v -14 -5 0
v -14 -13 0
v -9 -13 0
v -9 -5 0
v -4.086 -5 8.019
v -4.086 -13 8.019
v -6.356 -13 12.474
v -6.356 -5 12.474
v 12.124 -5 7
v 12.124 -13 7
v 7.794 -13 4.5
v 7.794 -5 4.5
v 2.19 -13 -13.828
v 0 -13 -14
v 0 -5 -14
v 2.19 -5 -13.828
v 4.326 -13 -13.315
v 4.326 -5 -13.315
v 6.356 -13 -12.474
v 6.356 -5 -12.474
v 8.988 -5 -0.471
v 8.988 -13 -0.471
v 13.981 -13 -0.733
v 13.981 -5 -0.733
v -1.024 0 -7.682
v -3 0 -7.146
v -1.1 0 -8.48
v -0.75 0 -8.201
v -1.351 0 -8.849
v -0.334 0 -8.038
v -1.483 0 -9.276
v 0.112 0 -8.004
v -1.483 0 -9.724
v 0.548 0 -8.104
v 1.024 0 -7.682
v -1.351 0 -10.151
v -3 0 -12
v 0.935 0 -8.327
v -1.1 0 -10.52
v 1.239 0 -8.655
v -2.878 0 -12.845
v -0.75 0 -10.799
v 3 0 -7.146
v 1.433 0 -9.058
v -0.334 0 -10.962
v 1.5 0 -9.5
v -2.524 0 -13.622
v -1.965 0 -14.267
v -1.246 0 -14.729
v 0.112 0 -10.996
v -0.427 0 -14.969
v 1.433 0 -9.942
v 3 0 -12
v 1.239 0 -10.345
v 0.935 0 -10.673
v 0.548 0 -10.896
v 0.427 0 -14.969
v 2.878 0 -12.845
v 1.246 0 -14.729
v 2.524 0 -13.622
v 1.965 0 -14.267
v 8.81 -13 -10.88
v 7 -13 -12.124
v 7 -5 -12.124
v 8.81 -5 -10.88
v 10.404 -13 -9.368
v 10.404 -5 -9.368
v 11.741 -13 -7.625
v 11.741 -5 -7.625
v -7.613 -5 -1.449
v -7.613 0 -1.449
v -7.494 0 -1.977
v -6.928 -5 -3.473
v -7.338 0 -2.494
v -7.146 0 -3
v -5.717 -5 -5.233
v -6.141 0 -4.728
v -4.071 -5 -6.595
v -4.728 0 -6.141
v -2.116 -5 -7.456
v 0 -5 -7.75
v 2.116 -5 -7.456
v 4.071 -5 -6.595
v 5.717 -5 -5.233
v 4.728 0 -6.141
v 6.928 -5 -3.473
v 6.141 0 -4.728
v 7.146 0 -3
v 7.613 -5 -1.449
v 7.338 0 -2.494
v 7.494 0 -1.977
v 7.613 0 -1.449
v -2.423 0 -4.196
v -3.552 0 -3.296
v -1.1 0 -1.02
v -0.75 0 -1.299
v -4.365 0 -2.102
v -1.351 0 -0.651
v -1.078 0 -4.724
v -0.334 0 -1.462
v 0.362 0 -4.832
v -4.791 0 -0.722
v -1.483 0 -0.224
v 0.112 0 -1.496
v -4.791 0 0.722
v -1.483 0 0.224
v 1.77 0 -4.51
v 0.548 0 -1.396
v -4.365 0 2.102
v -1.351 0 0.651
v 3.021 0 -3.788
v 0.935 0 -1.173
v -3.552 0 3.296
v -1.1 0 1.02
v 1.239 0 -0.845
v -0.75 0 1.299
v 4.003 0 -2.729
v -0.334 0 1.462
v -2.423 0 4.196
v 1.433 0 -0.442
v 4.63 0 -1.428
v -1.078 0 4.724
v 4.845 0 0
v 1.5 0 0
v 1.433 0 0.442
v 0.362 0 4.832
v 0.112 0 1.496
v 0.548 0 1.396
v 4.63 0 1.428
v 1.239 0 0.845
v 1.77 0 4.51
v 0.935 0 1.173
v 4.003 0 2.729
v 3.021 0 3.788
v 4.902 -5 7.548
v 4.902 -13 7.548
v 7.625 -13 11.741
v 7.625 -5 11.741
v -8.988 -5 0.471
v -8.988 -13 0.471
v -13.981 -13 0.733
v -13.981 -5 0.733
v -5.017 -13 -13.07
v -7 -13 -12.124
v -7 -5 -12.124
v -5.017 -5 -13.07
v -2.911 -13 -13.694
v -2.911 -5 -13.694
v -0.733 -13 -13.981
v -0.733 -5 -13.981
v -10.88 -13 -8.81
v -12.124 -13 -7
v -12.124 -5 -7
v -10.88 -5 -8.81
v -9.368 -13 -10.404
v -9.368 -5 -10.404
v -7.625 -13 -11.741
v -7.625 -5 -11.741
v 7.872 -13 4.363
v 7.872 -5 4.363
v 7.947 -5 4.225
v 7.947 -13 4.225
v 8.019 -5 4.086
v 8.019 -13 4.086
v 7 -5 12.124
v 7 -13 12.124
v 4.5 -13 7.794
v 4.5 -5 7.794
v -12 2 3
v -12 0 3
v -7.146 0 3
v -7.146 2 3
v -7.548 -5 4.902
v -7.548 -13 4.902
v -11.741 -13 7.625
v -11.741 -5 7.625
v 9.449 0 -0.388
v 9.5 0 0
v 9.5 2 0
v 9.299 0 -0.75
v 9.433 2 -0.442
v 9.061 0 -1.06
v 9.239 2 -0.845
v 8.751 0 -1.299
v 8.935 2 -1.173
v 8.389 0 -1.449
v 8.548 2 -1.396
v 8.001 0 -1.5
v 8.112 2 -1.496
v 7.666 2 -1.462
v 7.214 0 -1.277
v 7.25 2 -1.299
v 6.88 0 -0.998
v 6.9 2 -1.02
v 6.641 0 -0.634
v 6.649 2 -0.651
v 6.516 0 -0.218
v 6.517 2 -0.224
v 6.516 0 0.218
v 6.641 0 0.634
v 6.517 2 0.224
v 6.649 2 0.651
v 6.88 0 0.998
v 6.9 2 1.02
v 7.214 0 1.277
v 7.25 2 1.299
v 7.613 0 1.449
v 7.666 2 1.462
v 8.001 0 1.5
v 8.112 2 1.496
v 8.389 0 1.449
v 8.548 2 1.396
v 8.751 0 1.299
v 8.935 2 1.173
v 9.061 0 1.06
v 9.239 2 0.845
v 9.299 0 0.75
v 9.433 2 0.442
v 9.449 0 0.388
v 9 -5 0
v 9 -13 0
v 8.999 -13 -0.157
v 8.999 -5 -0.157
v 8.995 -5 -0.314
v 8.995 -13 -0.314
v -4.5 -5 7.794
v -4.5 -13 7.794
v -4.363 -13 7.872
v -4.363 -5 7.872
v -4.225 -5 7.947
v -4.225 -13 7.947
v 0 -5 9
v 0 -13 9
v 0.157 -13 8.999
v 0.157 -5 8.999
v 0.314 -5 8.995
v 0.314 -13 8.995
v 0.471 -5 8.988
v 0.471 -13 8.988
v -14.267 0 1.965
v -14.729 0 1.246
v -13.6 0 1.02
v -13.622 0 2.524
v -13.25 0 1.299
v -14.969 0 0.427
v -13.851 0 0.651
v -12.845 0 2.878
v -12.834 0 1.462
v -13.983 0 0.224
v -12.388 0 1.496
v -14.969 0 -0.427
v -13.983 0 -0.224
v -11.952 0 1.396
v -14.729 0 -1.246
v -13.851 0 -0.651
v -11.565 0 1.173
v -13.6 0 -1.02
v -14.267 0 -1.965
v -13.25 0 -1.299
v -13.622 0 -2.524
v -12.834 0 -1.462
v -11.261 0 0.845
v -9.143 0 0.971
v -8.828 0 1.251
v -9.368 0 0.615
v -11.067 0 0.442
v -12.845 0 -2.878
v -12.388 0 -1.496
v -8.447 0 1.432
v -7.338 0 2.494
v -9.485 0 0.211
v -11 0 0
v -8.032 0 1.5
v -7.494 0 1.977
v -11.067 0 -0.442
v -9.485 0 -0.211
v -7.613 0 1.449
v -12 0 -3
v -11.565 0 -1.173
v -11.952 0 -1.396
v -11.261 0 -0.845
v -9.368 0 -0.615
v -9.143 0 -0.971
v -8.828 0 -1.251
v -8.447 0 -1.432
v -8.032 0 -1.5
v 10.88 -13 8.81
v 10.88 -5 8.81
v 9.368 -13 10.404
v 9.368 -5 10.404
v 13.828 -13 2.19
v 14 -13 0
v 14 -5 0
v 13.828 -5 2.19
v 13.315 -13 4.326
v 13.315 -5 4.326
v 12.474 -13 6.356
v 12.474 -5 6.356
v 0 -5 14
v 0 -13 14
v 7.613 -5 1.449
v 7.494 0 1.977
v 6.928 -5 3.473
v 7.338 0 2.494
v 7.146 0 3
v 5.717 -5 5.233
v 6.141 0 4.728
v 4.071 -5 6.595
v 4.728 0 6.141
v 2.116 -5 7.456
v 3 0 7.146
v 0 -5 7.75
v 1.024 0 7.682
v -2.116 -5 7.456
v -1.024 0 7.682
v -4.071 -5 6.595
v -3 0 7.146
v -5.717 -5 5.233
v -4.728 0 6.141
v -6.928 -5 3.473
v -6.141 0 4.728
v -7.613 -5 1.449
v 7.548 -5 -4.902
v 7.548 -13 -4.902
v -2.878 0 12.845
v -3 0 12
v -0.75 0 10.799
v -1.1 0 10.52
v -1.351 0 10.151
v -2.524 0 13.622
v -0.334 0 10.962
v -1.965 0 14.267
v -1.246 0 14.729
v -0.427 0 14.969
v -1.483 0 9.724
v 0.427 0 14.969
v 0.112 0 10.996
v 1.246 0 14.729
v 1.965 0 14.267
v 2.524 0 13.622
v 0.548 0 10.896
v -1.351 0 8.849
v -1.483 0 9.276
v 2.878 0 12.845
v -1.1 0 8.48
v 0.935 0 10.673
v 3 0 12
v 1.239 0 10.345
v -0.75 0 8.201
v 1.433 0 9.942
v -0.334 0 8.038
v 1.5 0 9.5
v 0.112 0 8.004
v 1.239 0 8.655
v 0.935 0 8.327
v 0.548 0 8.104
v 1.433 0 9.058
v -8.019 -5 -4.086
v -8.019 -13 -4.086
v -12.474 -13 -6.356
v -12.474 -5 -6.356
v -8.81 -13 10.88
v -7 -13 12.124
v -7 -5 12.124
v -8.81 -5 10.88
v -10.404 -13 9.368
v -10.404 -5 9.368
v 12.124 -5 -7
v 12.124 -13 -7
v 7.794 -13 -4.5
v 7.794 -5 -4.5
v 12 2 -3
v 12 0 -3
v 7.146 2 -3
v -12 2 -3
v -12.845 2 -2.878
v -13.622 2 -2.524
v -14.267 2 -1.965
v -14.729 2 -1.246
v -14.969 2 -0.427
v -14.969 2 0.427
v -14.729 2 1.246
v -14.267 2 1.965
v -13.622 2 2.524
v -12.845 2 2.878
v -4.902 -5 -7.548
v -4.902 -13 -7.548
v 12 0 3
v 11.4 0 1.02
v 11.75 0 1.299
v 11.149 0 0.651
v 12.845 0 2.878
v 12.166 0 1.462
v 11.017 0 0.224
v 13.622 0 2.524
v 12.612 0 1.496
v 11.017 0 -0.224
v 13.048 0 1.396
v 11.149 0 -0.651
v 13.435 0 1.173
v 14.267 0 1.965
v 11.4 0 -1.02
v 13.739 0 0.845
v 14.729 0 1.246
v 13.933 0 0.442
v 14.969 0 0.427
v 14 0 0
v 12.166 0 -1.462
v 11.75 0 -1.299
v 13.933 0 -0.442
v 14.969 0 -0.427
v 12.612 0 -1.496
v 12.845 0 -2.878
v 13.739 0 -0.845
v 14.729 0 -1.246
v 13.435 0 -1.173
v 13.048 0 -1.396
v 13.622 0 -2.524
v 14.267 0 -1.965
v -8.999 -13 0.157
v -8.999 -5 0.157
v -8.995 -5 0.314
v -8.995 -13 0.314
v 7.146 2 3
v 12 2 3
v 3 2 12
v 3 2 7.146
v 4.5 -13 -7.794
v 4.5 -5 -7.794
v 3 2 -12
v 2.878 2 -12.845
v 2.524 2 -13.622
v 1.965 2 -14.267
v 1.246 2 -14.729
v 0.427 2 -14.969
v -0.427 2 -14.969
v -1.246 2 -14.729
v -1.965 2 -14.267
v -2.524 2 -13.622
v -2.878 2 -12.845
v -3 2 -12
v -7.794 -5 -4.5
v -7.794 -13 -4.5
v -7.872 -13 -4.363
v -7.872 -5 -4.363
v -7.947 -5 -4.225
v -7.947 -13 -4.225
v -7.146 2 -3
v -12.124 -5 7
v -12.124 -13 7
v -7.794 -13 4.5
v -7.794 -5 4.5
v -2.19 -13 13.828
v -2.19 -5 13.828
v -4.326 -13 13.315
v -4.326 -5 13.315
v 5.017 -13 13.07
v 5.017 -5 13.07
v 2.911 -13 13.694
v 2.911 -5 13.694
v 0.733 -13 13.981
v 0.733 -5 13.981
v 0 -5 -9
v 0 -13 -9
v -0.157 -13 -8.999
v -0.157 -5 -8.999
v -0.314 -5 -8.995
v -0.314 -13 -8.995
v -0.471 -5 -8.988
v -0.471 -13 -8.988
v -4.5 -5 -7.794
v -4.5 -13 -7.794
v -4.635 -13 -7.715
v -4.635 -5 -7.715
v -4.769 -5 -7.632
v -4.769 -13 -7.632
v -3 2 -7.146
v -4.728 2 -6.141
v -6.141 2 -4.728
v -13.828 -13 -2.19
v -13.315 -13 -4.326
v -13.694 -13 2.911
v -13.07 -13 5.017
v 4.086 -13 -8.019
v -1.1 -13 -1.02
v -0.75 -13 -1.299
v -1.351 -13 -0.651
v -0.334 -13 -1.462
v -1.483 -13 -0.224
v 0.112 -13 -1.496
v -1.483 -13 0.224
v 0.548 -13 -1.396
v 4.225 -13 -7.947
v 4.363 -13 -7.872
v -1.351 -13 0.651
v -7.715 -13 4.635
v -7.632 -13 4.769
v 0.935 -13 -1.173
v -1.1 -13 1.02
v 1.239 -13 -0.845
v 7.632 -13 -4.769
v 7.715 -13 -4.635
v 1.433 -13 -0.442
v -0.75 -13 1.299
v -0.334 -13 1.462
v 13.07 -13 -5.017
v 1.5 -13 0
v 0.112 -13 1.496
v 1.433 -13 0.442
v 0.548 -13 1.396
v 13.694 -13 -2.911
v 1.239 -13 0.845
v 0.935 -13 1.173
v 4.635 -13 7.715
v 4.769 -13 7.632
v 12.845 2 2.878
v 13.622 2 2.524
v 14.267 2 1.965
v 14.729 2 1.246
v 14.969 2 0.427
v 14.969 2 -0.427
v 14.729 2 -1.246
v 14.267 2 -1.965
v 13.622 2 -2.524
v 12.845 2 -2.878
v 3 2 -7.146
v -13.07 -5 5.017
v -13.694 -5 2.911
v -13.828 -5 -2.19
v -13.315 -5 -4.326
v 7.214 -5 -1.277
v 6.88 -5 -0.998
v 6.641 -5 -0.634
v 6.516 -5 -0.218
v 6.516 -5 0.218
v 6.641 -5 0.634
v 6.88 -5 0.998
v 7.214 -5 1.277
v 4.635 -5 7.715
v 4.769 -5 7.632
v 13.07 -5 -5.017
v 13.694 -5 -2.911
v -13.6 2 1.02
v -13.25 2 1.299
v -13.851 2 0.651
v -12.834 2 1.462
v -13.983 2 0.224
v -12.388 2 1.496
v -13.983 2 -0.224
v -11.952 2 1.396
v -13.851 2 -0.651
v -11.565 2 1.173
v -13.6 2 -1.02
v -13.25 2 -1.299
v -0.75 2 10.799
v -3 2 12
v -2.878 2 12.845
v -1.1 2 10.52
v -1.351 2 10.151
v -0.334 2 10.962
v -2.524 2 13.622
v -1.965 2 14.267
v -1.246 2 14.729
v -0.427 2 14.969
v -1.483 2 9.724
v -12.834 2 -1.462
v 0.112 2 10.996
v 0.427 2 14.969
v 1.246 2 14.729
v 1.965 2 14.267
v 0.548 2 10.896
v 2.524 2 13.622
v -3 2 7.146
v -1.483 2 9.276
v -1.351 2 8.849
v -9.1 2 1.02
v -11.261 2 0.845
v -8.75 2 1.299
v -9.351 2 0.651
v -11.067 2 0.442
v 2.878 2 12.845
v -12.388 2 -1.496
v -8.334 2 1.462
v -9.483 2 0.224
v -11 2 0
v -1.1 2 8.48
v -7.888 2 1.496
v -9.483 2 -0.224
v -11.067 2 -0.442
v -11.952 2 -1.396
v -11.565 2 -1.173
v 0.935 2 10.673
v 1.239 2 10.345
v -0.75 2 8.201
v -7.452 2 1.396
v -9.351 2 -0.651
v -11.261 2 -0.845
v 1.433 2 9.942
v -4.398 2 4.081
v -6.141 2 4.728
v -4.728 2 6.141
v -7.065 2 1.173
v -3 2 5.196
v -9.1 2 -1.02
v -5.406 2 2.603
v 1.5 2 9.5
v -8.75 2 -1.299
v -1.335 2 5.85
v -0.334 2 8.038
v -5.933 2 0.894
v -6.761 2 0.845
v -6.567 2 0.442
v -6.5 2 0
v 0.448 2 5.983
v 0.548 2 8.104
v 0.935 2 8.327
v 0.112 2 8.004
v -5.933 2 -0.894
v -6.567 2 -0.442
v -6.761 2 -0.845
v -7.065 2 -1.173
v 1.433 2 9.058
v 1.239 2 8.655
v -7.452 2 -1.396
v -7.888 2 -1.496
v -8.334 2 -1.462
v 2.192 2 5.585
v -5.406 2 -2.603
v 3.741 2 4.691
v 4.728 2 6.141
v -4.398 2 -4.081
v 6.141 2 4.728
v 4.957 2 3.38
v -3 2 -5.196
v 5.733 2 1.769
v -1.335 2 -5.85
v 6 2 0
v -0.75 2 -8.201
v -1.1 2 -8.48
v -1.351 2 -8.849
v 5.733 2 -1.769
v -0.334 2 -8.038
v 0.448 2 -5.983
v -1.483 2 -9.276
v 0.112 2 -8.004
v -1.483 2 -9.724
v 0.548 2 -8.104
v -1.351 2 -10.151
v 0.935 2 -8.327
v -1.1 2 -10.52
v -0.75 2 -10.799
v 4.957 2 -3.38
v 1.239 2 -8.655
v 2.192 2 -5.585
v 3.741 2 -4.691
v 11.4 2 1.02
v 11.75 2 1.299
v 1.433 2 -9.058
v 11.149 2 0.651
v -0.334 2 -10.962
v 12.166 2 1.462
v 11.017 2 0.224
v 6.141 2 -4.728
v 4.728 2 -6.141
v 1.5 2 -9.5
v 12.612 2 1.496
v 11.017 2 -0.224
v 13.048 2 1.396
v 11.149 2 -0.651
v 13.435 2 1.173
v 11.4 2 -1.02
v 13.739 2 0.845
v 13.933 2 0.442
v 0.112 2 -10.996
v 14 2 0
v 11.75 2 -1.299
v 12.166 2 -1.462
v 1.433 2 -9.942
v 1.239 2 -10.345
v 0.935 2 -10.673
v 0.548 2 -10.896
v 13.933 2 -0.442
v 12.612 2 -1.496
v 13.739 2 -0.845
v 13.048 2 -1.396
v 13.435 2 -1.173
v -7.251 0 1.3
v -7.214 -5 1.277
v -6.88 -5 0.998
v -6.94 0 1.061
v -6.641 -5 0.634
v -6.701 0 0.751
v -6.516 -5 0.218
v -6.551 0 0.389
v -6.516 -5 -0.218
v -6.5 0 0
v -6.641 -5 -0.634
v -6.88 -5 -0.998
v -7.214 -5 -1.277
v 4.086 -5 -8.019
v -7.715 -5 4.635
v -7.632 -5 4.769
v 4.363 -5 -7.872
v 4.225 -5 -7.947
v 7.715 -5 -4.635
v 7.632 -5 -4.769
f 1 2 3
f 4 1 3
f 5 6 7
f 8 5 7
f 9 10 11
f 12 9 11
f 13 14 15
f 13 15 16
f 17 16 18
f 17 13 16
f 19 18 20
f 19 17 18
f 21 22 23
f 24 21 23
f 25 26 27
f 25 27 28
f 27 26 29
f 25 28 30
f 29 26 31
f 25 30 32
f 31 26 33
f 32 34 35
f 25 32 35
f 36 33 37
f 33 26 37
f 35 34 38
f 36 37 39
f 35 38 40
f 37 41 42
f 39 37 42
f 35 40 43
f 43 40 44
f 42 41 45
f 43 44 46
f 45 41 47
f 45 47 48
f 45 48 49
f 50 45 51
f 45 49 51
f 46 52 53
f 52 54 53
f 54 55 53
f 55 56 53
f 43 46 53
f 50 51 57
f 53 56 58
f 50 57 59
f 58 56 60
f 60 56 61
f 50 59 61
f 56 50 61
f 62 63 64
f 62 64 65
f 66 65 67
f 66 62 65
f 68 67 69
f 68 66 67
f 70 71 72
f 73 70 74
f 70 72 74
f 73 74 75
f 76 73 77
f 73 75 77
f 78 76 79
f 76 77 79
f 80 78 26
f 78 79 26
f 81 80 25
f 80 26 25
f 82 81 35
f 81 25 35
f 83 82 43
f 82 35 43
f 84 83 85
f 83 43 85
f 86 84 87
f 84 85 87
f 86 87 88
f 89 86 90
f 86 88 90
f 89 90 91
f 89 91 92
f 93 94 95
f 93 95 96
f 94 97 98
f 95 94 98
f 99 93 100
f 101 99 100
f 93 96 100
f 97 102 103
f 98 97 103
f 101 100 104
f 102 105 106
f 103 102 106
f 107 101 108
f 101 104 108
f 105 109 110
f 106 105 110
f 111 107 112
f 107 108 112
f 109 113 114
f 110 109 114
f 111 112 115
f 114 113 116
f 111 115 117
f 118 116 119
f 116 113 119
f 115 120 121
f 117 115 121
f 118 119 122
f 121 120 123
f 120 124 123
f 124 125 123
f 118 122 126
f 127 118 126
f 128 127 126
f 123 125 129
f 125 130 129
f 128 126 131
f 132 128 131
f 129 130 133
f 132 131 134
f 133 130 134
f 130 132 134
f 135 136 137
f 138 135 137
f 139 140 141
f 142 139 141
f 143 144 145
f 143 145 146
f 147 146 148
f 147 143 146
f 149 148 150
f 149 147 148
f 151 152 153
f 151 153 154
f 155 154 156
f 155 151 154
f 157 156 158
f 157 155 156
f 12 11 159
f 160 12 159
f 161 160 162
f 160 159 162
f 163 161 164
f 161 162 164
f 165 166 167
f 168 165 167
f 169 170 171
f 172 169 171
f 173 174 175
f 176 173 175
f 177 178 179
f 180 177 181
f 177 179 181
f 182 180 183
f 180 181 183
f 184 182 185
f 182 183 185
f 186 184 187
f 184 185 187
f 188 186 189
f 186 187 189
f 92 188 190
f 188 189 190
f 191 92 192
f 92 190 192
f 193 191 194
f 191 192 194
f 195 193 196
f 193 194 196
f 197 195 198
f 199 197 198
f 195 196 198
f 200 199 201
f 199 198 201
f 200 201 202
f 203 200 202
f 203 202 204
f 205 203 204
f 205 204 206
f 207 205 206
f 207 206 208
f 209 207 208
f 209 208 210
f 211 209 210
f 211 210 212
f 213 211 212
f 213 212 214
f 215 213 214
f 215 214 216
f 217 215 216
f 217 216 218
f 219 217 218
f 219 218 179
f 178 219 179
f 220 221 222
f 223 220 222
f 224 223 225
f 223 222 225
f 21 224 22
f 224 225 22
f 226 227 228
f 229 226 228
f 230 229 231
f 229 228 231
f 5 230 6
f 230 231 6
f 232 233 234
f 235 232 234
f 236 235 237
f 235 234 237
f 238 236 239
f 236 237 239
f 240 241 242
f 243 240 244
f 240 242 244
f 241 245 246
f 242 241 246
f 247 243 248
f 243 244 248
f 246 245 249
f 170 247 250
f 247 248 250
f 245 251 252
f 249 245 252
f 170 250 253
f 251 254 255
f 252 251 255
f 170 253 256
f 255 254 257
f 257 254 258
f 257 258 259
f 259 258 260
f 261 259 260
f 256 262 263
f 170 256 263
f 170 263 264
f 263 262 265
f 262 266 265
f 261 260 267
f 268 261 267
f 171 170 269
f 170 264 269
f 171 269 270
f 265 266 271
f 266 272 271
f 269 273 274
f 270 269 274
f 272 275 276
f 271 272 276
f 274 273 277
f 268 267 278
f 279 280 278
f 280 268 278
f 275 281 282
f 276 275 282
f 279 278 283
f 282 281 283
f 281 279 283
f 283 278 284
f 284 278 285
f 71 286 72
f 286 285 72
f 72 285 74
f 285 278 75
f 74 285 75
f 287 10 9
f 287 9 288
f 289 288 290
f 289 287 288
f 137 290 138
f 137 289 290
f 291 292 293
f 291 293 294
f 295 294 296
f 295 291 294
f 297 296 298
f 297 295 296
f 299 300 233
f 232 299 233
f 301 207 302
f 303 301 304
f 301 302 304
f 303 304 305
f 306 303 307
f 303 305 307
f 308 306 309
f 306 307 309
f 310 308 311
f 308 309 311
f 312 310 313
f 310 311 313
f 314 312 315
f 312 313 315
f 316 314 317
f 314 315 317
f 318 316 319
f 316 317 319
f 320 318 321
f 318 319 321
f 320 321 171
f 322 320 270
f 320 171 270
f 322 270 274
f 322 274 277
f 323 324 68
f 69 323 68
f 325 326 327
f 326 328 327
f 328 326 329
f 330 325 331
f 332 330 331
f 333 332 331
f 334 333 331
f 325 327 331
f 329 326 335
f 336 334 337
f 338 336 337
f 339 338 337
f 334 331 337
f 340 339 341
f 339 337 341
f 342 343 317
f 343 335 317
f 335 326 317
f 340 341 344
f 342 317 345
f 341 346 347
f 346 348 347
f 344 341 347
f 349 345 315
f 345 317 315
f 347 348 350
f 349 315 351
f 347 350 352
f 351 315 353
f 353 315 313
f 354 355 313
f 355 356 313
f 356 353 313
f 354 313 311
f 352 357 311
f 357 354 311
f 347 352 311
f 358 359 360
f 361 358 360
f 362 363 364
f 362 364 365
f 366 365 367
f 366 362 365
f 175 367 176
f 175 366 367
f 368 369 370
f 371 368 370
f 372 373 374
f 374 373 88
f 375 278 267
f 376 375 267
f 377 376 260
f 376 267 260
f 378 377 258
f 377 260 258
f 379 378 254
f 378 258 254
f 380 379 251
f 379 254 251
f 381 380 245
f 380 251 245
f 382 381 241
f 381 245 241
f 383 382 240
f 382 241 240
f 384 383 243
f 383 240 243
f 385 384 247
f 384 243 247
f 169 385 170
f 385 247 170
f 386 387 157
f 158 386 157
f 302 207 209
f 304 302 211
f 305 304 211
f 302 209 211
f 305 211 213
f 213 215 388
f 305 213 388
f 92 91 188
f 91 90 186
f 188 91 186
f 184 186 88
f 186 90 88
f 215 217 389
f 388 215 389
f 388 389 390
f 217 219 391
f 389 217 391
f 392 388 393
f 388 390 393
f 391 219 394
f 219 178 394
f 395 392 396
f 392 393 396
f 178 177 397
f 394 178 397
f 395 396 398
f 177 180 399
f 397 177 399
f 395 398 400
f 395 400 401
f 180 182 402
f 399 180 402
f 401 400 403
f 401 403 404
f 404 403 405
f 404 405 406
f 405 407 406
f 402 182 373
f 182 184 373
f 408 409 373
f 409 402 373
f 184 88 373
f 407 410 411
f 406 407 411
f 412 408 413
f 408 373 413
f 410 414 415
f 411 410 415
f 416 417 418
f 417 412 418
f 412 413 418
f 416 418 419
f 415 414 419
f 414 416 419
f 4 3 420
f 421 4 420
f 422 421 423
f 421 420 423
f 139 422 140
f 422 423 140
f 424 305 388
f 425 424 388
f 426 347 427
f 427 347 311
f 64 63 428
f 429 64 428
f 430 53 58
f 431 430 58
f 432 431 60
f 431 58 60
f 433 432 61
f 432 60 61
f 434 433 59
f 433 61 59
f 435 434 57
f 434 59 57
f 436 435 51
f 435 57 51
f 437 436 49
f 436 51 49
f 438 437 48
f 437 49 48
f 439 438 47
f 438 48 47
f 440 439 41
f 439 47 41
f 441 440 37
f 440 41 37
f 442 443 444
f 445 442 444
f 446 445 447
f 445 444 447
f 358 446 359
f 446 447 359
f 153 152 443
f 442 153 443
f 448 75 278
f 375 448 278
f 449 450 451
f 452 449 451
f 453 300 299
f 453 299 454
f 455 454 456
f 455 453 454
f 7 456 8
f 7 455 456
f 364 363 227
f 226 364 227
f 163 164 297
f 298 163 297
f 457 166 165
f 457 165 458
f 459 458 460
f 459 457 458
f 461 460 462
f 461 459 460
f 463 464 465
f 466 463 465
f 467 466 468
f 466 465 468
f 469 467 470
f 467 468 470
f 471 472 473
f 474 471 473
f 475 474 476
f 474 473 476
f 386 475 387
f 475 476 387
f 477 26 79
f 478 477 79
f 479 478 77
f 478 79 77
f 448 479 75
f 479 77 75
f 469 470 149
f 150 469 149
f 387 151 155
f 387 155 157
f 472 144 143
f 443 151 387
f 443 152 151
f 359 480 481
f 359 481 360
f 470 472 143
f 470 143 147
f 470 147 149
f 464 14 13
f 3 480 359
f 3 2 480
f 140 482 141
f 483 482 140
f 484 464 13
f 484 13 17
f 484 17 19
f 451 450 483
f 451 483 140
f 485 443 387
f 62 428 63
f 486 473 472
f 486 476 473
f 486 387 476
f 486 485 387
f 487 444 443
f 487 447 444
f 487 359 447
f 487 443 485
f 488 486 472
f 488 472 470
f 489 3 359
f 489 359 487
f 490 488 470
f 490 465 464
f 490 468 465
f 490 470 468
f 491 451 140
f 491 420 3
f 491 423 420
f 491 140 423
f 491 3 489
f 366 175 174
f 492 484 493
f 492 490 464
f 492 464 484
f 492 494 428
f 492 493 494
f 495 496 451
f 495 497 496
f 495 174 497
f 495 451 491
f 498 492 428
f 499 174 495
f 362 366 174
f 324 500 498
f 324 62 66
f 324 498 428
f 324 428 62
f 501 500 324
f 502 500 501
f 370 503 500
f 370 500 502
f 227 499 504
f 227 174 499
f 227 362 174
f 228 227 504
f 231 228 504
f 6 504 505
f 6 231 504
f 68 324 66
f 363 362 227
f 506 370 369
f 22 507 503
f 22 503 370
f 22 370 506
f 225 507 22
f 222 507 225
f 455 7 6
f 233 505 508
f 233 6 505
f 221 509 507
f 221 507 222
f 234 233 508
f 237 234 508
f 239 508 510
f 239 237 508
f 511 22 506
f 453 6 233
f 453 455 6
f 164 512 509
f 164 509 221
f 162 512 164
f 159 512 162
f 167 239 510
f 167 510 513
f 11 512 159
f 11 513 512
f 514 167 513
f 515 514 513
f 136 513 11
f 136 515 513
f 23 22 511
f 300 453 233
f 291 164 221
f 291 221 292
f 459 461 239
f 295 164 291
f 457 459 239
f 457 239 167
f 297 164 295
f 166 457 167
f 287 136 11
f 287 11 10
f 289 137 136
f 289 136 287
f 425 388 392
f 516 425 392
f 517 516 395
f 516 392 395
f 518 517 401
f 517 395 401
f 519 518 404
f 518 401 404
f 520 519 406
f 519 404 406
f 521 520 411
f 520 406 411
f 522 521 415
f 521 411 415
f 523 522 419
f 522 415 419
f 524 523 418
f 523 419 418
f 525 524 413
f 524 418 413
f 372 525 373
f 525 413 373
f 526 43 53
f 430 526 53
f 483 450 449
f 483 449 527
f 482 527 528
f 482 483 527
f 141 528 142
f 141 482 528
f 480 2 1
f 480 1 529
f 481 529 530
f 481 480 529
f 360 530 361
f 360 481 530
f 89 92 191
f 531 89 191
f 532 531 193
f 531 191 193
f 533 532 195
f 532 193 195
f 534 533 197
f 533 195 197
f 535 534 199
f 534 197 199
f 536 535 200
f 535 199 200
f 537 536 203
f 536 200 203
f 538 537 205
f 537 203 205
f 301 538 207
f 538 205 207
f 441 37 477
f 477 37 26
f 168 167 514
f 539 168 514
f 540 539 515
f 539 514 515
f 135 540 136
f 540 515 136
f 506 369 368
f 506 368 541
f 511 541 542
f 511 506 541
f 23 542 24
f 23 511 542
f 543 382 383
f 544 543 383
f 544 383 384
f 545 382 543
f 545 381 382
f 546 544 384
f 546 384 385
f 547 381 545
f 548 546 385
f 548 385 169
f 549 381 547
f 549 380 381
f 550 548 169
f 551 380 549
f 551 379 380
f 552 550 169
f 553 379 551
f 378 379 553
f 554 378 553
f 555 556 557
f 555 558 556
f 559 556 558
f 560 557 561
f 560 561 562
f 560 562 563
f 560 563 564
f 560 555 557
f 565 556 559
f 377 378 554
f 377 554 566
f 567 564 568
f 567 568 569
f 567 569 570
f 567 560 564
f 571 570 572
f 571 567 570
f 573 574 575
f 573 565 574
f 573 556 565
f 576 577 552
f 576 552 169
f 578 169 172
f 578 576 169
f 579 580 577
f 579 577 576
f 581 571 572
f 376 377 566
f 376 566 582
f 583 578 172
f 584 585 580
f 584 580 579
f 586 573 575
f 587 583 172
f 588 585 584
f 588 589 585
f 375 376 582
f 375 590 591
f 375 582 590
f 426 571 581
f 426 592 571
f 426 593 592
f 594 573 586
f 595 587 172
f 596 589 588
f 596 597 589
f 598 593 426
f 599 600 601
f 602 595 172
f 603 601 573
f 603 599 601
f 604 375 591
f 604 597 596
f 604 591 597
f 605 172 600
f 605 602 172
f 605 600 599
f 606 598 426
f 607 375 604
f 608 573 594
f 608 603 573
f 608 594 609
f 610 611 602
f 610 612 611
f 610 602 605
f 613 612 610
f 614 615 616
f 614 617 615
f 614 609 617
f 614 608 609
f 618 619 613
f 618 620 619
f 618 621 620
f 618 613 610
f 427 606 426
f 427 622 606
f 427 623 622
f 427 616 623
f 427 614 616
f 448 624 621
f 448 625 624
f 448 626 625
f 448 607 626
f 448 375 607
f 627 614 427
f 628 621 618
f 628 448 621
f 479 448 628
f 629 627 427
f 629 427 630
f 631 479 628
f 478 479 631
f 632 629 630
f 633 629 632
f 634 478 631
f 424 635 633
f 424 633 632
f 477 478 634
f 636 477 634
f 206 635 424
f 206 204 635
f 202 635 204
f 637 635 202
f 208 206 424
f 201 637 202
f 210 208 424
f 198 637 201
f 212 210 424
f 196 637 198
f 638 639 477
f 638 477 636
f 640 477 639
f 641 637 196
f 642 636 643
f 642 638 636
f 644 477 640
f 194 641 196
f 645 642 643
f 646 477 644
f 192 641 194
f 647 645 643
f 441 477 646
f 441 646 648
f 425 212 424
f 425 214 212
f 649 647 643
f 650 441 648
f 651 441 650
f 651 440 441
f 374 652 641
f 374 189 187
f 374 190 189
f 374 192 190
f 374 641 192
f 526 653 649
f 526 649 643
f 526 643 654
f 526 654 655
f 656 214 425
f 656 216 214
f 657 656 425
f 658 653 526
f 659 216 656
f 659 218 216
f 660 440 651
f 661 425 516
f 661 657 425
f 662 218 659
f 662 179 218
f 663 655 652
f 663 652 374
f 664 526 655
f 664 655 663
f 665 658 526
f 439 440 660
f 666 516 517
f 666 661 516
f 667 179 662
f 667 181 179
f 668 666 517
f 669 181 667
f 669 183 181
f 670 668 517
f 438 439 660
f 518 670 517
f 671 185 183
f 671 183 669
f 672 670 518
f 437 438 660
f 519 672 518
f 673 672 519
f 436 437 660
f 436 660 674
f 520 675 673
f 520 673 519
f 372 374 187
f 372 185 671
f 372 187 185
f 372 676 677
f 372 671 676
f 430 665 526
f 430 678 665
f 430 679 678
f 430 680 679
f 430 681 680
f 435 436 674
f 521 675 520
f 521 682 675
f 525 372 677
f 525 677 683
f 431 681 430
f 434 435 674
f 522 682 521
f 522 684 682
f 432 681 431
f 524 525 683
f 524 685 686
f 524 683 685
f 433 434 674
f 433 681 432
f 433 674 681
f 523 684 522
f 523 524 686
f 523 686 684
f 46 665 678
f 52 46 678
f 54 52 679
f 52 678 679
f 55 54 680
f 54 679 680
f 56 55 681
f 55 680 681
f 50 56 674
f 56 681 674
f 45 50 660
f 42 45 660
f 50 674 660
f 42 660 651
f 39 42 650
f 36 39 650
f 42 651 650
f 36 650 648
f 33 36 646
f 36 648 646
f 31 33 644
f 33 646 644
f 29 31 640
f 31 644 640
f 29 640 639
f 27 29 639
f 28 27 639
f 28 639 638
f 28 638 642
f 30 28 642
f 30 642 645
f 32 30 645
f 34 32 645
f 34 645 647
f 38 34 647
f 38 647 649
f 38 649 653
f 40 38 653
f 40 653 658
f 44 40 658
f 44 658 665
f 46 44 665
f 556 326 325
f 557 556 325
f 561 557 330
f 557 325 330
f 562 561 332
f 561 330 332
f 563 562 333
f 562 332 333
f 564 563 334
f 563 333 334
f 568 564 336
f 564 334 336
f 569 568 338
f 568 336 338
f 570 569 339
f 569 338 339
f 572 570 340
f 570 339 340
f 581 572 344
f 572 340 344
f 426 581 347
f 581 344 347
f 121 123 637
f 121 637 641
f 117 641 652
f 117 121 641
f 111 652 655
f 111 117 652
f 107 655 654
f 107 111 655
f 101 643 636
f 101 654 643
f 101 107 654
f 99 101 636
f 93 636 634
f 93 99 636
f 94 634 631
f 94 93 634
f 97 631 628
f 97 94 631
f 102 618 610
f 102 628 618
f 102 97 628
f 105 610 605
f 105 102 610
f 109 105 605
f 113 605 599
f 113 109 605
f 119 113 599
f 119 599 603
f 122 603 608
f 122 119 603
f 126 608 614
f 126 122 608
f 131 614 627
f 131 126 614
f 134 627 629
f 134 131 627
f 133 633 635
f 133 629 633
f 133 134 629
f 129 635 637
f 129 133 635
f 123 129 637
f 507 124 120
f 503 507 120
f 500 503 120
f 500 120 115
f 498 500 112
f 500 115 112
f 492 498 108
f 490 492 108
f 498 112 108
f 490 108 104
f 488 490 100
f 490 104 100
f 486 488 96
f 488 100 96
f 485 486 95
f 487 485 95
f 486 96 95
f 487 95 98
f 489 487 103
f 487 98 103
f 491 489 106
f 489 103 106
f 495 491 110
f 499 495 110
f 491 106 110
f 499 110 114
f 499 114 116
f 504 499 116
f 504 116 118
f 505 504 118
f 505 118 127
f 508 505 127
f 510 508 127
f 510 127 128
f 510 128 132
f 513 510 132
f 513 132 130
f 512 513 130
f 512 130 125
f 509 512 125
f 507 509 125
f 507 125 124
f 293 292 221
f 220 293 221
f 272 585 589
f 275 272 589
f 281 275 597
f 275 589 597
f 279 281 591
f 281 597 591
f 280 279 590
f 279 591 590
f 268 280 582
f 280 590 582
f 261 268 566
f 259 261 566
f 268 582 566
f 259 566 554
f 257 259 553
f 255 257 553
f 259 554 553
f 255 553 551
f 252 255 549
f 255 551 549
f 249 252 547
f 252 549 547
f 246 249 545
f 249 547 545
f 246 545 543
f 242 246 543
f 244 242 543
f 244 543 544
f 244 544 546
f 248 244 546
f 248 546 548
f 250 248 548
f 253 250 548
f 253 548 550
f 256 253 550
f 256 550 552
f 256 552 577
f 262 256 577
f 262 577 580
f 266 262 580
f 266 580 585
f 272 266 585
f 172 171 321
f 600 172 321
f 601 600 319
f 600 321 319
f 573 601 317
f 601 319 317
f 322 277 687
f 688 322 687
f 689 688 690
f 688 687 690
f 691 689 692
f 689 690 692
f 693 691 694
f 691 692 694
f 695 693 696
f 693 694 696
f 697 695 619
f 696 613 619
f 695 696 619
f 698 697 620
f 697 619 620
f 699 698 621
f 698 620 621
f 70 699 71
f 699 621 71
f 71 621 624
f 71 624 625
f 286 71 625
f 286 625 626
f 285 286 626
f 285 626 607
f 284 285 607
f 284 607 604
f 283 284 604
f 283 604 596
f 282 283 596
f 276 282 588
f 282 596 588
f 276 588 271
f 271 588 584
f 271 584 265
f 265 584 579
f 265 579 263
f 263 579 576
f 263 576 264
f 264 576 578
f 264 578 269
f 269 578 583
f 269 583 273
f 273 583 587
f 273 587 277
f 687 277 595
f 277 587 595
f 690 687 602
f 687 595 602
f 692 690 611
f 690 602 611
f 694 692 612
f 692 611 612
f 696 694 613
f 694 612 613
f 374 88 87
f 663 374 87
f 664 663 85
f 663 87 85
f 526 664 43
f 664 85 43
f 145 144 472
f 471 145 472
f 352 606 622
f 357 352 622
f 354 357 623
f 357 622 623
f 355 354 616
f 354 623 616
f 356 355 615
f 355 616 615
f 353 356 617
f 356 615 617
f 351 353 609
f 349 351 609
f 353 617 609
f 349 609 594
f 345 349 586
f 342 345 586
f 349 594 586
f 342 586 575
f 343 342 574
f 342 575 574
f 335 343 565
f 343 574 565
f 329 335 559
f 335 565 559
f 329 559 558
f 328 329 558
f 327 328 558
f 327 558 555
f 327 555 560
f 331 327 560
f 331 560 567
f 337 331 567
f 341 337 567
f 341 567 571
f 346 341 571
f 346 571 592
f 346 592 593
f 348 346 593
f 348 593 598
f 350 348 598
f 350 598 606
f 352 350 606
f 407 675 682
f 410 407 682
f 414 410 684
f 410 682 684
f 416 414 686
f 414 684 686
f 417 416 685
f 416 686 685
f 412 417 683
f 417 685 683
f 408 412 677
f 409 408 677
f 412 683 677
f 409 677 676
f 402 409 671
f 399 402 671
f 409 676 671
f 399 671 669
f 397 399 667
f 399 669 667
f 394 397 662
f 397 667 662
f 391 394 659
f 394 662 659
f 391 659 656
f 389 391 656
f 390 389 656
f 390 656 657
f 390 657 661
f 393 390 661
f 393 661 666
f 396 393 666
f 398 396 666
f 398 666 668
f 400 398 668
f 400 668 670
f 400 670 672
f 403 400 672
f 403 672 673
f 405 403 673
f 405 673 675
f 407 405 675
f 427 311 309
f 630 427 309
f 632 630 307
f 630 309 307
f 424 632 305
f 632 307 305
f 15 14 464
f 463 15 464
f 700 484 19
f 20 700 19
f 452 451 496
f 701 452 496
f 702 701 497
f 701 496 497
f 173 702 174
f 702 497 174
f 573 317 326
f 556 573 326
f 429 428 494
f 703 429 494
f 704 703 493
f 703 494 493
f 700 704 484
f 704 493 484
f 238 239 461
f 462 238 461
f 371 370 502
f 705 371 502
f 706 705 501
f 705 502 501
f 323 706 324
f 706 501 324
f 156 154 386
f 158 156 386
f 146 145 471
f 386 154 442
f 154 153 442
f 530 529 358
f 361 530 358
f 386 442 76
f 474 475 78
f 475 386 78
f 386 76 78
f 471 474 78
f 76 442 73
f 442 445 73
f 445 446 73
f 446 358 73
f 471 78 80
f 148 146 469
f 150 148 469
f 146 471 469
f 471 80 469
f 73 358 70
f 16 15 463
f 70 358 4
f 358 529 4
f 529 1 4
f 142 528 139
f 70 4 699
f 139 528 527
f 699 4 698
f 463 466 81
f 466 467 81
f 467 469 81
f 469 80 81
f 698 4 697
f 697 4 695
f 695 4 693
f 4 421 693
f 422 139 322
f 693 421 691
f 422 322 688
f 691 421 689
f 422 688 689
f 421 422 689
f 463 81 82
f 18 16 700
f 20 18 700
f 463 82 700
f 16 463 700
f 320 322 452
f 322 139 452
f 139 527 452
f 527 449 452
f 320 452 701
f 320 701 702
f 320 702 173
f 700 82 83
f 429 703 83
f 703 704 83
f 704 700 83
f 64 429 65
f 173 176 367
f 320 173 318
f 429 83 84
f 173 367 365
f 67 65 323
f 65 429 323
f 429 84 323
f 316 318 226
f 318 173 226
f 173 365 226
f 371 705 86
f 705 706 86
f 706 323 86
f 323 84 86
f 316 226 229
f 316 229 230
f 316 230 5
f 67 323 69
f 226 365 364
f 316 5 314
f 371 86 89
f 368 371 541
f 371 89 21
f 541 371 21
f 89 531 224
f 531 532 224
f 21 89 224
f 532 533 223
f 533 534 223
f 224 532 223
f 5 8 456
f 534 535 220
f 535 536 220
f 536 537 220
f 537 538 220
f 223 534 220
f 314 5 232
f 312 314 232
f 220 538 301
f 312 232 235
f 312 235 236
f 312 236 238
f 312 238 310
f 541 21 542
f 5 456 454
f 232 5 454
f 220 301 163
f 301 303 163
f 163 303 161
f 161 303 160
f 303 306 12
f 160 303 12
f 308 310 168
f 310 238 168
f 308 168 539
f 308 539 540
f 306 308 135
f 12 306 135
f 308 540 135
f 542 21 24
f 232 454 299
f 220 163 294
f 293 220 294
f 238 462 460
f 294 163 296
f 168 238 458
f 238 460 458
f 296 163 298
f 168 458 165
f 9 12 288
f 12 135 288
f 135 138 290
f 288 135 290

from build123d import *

# Parameters (mm, degrees)
SKETCH1_W           = 6
SKETCH1_H           = 6
BOSS_EXTRUDE1_DEPTH = 2
SKETCH2_R           = 1.5
CUT_EXTRUDE1_DEPTH  = 3
SKETCH3_R           = 6
CUT_EXTRUDE2_DEPTH  = 3
CUT_EXTRUDE2_TAPER  = 30
BOSS_EXTRUDE2_DEPTH = 13
SKETCH5_R           = 14
BOSS_EXTRUDE3_DEPTH = 8
SKETCH6_R           = 1.5
CUT_EXTRUDE3_DEPTH  = 14
CUT_EXTRUDE5_DEPTH  = 8
CIRPATTERN1_COUNT   = 12


with BuildPart() as part:
    # Sketch1 → Boss-Extrude1 (new body)
    with BuildSketch(Plane(origin=(0, 0, 0), x_dir=(1, 0, 0), z_dir=(0, 1, 0))):
        with BuildLine():
            Line((-12, -3), (-7.145802964, -3))
            ThreePointArc((-7.145802964, -3), (-7.75, 0), (-7.145802964, 3))
            Line((-7.145802964, 3), (-12, 3))
            ThreePointArc((-12, 3), (-15, 0), (-12, -3))
        make_face()
        with BuildLine():
            Line((-7.145802964, -3), (-3, -3))
            Line((-3, -3), (-3, 3))
            Line((-3, 3), (-7.145802964, 3))
            ThreePointArc((-7.145802964, 3), (-7.75, 0), (-7.145802964, -3))
        make_face()
        with BuildLine():
            Line((3, -3), (3, -7.145802964))
            ThreePointArc((3, -7.145802964), (5.480077554, -5.480077554), (7.145802964, -3))
            Line((7.145802964, -3), (3, -3))
        make_face()
        with BuildLine():
            Line((-3, -3), (-3, -7.145802964))
            ThreePointArc((-3, -7.145802964), (0, -7.75), (3, -7.145802964))
            Line((3, -7.145802964), (3, -3))
            Line((3, -3), (-3, -3))
        make_face()
        with BuildLine():
            ThreePointArc((-7.145802964, -3), (-5.480077554, -5.480077554), (-3, -7.145802964))
            Line((-3, -7.145802964), (-3, -3))
            Line((-3, -3), (-7.145802964, -3))
        make_face()
        with BuildLine():
            Line((-7.145802964, 3), (-3, 3))
            Line((-3, 3), (-3, 7.145802964))
            ThreePointArc((-3, 7.145802964), (-5.480077554, 5.480077554), (-7.145802964, 3))
        make_face()
        with BuildLine():
            Line((-3, 7.145802964), (-3, 3))
            Line((-3, 3), (3, 3))
            Line((3, 3), (3, 7.145802964))
            ThreePointArc((3, 7.145802964), (0, 7.75), (-3, 7.145802964))
        make_face()
        with BuildLine():
            Line((-3, 12), (-3, 7.145802964))
            ThreePointArc((-3, 7.145802964), (0, 7.75), (3, 7.145802964))
            Line((3, 7.145802964), (3, 12))
            ThreePointArc((3, 12), (0, 15), (-3, 12))
        make_face()
        Rectangle(SKETCH1_W, SKETCH1_H)
        with BuildLine():
            Line((3, 3), (3, -3))
            Line((3, -3), (7.145802964, -3))
            ThreePointArc((7.145802964, -3), (7.597449341, -1.530118791), (7.75, 0))
            ThreePointArc((7.75, 0), (7.597449341, 1.530118791), (7.145802964, 3))
            Line((7.145802964, 3), (3, 3))
        make_face()
        with BuildLine():
            Line((3, 7.145802964), (3, 3))
            Line((3, 3), (7.145802964, 3))
            ThreePointArc((7.145802964, 3), (5.480077554, 5.480077554), (3, 7.145802964))
        make_face()
        with BuildLine():
            ThreePointArc((7.75, 0), (7.597449341, -1.530118791), (7.145802964, -3))
            Line((7.145802964, -3), (12, -3))
            ThreePointArc((12, -3), (15, 0), (12, 3))
            Line((12, 3), (7.145802964, 3))
            ThreePointArc((7.145802964, 3), (7.597449341, 1.530118791), (7.75, 0))
        make_face()
        with BuildLine():
            Line((-3, -7.145802964), (-3, -12))
            ThreePointArc((-3, -12), (0, -15), (3, -12))
            Line((3, -12), (3, -7.145802964))
            ThreePointArc((3, -7.145802964), (0, -7.75), (-3, -7.145802964))
        make_face()
    extrude(amount=BOSS_EXTRUDE1_DEPTH)

    # Sketch2 → Cut-Extrude1 (cut, through all)
    with BuildSketch(Plane(origin=(0, 2, 0), x_dir=(1, 0, 0), z_dir=(0, 1, 0))):
        with Locations((8, 0)):
            Circle(SKETCH2_R)
        with Locations((12.5, 0)):
            Circle(SKETCH2_R)
        with Locations((0, 9.5)):
            Circle(SKETCH2_R)
        with Locations((0, -9.5)):
            Circle(SKETCH2_R)
        with Locations((-12.5, 0)):
            Circle(SKETCH2_R)
        with Locations((-8, 0)):
            Circle(SKETCH2_R)
    extrude(amount=-CUT_EXTRUDE1_DEPTH, mode=Mode.SUBTRACT)

    # Sketch3 → Cut-Extrude2 (cut, through all)
    with BuildSketch(Plane(origin=(0, 2, 0), x_dir=(1, 0, 0), z_dir=(0, 1, 0))):
        Circle(SKETCH3_R)
    extrude(amount=-CUT_EXTRUDE2_DEPTH, taper=CUT_EXTRUDE2_TAPER, mode=Mode.SUBTRACT)

    # Sketch4 → Boss-Extrude2 (add)
    with BuildSketch(Plane.XZ):
        with BuildLine():
            ThreePointArc((-7.61328125, -1.449292451), (0, -7.75), (7.61328125, -1.449292451))
            ThreePointArc((7.61328125, -1.449292451), (6.5, 0), (7.61328125, 1.449292451))
            ThreePointArc((7.61328125, 1.449292451), (0, 7.75), (-7.61328125, 1.449292451))
            ThreePointArc((-7.61328125, 1.449292451), (-6.5, 0), (-7.61328125, -1.449292451))
        make_face()
    extrude(amount=BOSS_EXTRUDE2_DEPTH)

    # Sketch5 → Boss-Extrude3 (add)
    with BuildSketch(Plane.XZ.offset(13)):
        Circle(SKETCH5_R)
    extrude(amount=-BOSS_EXTRUDE3_DEPTH)

    # Sketch6 → Cut-Extrude3 (cut, through all)
    with BuildSketch(Plane(origin=(0, 0, 0), x_dir=(1, 0, 0), z_dir=(0, 1, 0))):
        Circle(SKETCH6_R)
    extrude(amount=-CUT_EXTRUDE3_DEPTH, mode=Mode.SUBTRACT)

    # Sketch7 → Cut-Extrude5 (cut)
    with BuildSketch(Plane.XZ.offset(13)):
        with BuildLine():
            Line((14, 0), (9, 0))
            ThreePointArc((9, 0), (8.996915925, -0.235592535), (8.987665813, -0.471023606))
            Line((8.987665813, -0.471023606), (13.980813487, -0.732703387))
            ThreePointArc((13.980813487, -0.732703387), (13.99520255, -0.366477276), (14, 0))
        make_face()
    cut_extrude5 = extrude(amount=-CUT_EXTRUDE5_DEPTH, mode=Mode.SUBTRACT)

    # CirPattern1: Cut-Extrude5 ×12 about axis
    cirpattern1_axis = Axis((0, -13, 0), (0, -1, 0))
    for i in range(1, CIRPATTERN1_COUNT):
        add(cut_extrude5.rotate(cirpattern1_axis, i * 360 / CIRPATTERN1_COUNT), mode=Mode.SUBTRACT)


solid = part.part
